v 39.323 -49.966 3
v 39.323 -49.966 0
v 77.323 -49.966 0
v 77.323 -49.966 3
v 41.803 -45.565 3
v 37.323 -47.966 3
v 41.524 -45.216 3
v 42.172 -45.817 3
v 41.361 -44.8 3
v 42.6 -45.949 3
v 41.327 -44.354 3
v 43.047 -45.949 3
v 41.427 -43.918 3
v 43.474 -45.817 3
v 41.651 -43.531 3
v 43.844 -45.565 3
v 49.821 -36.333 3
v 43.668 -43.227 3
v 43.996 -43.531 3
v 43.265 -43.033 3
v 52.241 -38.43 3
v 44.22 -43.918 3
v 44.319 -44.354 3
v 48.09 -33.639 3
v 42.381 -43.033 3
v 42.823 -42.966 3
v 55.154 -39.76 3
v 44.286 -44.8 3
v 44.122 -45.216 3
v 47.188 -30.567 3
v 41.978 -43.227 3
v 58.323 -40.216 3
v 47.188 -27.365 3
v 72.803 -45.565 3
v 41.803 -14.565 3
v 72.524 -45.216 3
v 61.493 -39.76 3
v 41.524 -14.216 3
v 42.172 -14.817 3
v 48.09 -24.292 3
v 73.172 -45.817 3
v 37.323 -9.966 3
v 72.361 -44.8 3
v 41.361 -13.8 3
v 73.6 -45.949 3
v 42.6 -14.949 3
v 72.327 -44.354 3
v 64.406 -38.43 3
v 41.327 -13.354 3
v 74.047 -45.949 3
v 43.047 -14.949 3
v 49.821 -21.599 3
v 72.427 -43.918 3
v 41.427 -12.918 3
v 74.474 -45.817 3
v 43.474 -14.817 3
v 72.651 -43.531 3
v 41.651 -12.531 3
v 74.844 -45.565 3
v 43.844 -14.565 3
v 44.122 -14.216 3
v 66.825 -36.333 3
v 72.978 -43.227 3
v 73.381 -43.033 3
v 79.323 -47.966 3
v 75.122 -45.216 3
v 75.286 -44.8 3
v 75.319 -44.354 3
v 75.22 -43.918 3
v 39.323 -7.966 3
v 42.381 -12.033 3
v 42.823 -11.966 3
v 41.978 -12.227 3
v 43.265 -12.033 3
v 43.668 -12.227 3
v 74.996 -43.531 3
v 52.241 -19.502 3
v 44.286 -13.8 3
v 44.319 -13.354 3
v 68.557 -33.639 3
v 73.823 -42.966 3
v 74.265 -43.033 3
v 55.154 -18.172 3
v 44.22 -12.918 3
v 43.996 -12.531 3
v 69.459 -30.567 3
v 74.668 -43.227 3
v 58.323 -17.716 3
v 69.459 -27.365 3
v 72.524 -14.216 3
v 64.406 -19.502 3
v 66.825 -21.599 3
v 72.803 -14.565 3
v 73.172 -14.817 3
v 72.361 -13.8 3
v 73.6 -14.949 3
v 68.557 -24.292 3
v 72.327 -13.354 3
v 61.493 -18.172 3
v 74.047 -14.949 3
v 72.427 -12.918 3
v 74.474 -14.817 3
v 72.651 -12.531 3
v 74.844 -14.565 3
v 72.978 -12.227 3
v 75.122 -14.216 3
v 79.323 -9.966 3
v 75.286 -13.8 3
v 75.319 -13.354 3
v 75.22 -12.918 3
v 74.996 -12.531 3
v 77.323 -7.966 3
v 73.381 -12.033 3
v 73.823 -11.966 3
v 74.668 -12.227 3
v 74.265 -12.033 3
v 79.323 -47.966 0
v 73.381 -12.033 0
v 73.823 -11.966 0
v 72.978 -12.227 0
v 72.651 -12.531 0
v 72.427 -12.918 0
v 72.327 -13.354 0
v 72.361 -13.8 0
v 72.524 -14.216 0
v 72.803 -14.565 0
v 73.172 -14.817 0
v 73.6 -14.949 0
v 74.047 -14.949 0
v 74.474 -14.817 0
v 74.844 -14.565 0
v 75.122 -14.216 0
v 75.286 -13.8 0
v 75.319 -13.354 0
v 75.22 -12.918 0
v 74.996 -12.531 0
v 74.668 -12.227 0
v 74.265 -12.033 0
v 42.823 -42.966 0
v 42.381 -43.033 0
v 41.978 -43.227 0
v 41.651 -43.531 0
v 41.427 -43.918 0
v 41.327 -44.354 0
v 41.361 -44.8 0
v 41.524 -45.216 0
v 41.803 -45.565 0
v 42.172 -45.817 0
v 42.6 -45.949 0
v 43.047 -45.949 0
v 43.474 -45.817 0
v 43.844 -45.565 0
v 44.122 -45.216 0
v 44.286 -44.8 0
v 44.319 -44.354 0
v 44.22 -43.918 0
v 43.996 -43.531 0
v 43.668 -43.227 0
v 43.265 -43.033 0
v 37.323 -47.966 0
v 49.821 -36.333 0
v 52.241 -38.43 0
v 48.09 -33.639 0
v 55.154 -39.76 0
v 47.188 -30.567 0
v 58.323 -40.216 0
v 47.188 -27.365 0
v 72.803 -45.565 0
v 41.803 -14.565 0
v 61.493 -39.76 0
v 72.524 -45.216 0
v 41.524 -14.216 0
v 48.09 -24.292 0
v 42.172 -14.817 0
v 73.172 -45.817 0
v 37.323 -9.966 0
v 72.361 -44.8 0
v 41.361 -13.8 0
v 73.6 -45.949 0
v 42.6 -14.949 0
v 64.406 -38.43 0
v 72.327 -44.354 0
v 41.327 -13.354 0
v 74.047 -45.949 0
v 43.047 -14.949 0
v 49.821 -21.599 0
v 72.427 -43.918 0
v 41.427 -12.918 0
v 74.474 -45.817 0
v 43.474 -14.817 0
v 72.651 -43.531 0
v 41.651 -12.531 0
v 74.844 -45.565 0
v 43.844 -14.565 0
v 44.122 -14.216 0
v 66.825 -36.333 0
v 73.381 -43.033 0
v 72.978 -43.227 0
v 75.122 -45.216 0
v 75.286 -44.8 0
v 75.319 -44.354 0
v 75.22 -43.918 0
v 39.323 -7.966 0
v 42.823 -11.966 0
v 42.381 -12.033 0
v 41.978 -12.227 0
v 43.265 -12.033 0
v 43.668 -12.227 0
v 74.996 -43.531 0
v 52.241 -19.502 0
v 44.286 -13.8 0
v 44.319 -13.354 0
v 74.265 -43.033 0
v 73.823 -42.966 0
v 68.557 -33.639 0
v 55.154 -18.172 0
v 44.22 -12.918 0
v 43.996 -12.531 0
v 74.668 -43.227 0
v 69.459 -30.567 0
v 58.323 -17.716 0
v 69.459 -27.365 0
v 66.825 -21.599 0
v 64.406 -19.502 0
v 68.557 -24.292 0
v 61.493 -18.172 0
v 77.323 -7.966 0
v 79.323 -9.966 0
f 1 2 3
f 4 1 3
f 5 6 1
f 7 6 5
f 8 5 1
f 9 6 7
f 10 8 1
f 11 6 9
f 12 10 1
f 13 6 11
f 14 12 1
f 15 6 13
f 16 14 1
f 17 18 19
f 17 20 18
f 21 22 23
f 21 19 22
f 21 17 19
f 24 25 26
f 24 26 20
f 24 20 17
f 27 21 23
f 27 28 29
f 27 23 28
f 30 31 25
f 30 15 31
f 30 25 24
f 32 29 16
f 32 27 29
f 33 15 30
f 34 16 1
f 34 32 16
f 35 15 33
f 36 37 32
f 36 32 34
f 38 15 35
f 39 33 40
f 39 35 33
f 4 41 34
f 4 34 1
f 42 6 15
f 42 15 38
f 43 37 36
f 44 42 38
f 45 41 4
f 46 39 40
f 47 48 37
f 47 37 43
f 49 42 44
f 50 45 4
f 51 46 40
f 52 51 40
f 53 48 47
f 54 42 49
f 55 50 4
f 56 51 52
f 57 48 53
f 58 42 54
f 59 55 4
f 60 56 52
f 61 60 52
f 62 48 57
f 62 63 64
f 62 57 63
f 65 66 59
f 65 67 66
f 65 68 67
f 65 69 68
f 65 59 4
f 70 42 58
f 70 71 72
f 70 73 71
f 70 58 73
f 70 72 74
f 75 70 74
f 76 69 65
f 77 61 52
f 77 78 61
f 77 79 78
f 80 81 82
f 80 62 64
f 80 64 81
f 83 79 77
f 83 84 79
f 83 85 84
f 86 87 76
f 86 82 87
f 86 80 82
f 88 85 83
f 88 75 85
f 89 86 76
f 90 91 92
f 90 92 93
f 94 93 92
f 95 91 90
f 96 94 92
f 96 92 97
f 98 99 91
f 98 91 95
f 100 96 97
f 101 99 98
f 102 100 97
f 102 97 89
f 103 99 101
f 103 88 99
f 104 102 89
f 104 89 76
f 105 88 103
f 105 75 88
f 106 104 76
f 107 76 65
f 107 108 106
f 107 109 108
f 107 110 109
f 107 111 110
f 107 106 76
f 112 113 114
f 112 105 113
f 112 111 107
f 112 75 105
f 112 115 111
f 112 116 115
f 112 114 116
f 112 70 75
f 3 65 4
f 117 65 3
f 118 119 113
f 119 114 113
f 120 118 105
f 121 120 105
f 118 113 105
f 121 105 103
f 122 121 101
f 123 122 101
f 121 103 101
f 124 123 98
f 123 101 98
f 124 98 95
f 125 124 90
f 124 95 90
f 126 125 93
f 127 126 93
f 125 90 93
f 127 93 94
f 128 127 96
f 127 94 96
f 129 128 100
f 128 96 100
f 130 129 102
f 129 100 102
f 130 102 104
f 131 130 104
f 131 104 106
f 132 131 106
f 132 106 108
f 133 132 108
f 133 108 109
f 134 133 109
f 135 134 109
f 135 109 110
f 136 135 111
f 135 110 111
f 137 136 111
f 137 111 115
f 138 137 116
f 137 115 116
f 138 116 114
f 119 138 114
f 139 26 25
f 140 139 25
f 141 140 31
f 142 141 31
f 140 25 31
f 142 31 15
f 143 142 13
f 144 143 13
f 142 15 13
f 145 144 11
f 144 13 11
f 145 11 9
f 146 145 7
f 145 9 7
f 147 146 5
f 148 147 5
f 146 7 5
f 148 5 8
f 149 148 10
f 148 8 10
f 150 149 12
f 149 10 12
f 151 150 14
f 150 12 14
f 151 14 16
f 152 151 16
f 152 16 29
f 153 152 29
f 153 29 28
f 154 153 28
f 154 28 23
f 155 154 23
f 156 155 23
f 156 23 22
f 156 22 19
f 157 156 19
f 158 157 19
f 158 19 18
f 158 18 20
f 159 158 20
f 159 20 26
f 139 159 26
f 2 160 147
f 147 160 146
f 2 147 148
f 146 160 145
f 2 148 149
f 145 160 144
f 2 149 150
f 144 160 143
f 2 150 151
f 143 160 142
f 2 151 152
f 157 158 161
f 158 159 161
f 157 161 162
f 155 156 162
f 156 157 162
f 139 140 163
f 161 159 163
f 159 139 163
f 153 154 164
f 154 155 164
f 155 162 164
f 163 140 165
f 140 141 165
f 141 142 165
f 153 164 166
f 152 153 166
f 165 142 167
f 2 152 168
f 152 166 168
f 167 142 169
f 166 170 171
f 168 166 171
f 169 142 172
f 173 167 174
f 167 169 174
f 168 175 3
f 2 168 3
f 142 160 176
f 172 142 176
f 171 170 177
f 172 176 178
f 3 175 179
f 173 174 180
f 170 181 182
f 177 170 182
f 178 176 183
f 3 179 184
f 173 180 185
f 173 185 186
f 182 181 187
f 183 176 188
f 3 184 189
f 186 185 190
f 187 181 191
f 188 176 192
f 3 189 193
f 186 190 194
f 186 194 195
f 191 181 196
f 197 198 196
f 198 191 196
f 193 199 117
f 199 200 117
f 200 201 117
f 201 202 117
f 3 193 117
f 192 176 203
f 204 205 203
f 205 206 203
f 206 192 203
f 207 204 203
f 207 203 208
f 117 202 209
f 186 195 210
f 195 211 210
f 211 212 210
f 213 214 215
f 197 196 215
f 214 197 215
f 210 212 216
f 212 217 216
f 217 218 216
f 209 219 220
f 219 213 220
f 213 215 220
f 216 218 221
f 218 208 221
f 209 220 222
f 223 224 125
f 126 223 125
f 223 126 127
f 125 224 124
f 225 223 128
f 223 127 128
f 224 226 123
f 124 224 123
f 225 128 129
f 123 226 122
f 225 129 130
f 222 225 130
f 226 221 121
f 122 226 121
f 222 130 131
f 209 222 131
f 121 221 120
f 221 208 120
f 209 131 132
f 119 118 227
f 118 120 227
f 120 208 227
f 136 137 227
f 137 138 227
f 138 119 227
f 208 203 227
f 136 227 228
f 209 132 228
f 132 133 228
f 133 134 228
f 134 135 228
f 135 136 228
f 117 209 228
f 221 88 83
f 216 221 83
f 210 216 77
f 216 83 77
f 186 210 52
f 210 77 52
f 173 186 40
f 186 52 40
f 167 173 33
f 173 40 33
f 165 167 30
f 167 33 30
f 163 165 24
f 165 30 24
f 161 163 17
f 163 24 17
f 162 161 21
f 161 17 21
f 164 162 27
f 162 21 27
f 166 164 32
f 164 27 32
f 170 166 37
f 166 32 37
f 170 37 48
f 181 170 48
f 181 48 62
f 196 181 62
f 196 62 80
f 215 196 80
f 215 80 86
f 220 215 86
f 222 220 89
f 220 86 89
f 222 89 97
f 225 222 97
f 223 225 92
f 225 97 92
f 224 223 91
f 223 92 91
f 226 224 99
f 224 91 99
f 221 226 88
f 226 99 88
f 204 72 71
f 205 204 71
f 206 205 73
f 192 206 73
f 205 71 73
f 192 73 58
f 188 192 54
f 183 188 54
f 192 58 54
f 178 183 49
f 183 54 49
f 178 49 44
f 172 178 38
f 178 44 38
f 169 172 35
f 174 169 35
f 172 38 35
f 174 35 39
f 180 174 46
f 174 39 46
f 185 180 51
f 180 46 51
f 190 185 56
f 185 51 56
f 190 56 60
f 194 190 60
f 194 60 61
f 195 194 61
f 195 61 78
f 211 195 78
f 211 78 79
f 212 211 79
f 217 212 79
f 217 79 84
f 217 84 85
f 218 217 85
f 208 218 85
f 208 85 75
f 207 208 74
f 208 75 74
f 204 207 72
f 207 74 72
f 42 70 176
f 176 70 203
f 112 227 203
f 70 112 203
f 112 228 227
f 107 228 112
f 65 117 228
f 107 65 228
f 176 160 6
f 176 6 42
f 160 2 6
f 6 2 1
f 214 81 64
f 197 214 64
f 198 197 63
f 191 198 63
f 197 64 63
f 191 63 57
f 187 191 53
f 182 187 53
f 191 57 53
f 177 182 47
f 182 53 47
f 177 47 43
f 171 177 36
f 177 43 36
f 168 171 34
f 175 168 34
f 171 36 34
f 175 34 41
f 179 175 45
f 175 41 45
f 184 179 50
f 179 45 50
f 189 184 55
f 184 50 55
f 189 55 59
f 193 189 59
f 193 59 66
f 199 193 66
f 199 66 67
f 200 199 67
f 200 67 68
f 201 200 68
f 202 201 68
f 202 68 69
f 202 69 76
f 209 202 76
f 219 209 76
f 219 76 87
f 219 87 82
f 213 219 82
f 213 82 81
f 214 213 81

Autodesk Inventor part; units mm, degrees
ref_plane "YZ Plane" through (0, 0, 0) normal (1, 0, 0) x (0, 1, 0)
ref_plane "XZ Plane" through (0, 0, 0) normal (0, 1, 0) x (-1, 0, 0)
ref_plane "XY Plane" through (0, 0, 0) normal (0, 0, 1) x (1, 0, 0)
sketch "Szkic1" plane through (0, 0, 0) normal (0, 0, 1) x (1, 0, 0)
  line L0 (37.3233, -49.9659) -> (79.3233, -49.9659)
  line L1 (79.3233, -49.9659) -> (79.3233, -7.9659)
  line L2 (79.3233, -7.9659) -> (37.3233, -7.9659)
  line L3 (37.3233, -49.9659) -> (37.3233, -7.9659)
  point P0 (0, 0)
  point P1 (42.8233, -13.4659)
  point P2 (73.8233, -13.4659)
  point P3 (42.8233, -44.4659)
  point P4 (73.8233, -44.4659)
  point P5 (58.3233, -28.9659)
  dimension "d0" = 42
  dimension "d2" = 15.5
  dimension "d3" = 15.5
  dimension "d4" = 15.5
  dimension "d5" = 15.5
  dimension "d6" = 15.5
  dimension "d7" = 15.5
  dimension "d8" = 15.5
  dimension "d9" = 15.5
  dimension "d10" = 21
  dimension "d11" = 21
  dimension "d19" = 21
extrude "Wyciągnięcie proste1" add sketch "Szkic1" along normal blind 3
hole "Otwór1" at (73.8233, -44.4659, 0) at (42.8233, -44.4659, 0) at (73.8233, -13.4659, 0) at (42.8233, -13.4659, 0) direction (0, 0, 1) diameter 3 end through all
hole "Otwór2" at (58.3233, -28.9659, 0) direction (0, 0, 1) diameter 22.5 end through all
chamfer "Faza1" distance 2 angle 45 4 edges at (37.3233, -7.9659, 1.5) (79.3233, -7.9659, 1.5) (79.3233, -49.9659, 1.5) (37.3233, -49.9659, 1.5)
equation "\"d2\" = 0.5 * d18"
equation "\"d3\" = d2"
equation "\"d4\" = d2"
equation "\"d11\" = d10"
equation "\"d18\" = 31"
properties part number "3DP_ABS_X_Axis_Motor_Spacer"
